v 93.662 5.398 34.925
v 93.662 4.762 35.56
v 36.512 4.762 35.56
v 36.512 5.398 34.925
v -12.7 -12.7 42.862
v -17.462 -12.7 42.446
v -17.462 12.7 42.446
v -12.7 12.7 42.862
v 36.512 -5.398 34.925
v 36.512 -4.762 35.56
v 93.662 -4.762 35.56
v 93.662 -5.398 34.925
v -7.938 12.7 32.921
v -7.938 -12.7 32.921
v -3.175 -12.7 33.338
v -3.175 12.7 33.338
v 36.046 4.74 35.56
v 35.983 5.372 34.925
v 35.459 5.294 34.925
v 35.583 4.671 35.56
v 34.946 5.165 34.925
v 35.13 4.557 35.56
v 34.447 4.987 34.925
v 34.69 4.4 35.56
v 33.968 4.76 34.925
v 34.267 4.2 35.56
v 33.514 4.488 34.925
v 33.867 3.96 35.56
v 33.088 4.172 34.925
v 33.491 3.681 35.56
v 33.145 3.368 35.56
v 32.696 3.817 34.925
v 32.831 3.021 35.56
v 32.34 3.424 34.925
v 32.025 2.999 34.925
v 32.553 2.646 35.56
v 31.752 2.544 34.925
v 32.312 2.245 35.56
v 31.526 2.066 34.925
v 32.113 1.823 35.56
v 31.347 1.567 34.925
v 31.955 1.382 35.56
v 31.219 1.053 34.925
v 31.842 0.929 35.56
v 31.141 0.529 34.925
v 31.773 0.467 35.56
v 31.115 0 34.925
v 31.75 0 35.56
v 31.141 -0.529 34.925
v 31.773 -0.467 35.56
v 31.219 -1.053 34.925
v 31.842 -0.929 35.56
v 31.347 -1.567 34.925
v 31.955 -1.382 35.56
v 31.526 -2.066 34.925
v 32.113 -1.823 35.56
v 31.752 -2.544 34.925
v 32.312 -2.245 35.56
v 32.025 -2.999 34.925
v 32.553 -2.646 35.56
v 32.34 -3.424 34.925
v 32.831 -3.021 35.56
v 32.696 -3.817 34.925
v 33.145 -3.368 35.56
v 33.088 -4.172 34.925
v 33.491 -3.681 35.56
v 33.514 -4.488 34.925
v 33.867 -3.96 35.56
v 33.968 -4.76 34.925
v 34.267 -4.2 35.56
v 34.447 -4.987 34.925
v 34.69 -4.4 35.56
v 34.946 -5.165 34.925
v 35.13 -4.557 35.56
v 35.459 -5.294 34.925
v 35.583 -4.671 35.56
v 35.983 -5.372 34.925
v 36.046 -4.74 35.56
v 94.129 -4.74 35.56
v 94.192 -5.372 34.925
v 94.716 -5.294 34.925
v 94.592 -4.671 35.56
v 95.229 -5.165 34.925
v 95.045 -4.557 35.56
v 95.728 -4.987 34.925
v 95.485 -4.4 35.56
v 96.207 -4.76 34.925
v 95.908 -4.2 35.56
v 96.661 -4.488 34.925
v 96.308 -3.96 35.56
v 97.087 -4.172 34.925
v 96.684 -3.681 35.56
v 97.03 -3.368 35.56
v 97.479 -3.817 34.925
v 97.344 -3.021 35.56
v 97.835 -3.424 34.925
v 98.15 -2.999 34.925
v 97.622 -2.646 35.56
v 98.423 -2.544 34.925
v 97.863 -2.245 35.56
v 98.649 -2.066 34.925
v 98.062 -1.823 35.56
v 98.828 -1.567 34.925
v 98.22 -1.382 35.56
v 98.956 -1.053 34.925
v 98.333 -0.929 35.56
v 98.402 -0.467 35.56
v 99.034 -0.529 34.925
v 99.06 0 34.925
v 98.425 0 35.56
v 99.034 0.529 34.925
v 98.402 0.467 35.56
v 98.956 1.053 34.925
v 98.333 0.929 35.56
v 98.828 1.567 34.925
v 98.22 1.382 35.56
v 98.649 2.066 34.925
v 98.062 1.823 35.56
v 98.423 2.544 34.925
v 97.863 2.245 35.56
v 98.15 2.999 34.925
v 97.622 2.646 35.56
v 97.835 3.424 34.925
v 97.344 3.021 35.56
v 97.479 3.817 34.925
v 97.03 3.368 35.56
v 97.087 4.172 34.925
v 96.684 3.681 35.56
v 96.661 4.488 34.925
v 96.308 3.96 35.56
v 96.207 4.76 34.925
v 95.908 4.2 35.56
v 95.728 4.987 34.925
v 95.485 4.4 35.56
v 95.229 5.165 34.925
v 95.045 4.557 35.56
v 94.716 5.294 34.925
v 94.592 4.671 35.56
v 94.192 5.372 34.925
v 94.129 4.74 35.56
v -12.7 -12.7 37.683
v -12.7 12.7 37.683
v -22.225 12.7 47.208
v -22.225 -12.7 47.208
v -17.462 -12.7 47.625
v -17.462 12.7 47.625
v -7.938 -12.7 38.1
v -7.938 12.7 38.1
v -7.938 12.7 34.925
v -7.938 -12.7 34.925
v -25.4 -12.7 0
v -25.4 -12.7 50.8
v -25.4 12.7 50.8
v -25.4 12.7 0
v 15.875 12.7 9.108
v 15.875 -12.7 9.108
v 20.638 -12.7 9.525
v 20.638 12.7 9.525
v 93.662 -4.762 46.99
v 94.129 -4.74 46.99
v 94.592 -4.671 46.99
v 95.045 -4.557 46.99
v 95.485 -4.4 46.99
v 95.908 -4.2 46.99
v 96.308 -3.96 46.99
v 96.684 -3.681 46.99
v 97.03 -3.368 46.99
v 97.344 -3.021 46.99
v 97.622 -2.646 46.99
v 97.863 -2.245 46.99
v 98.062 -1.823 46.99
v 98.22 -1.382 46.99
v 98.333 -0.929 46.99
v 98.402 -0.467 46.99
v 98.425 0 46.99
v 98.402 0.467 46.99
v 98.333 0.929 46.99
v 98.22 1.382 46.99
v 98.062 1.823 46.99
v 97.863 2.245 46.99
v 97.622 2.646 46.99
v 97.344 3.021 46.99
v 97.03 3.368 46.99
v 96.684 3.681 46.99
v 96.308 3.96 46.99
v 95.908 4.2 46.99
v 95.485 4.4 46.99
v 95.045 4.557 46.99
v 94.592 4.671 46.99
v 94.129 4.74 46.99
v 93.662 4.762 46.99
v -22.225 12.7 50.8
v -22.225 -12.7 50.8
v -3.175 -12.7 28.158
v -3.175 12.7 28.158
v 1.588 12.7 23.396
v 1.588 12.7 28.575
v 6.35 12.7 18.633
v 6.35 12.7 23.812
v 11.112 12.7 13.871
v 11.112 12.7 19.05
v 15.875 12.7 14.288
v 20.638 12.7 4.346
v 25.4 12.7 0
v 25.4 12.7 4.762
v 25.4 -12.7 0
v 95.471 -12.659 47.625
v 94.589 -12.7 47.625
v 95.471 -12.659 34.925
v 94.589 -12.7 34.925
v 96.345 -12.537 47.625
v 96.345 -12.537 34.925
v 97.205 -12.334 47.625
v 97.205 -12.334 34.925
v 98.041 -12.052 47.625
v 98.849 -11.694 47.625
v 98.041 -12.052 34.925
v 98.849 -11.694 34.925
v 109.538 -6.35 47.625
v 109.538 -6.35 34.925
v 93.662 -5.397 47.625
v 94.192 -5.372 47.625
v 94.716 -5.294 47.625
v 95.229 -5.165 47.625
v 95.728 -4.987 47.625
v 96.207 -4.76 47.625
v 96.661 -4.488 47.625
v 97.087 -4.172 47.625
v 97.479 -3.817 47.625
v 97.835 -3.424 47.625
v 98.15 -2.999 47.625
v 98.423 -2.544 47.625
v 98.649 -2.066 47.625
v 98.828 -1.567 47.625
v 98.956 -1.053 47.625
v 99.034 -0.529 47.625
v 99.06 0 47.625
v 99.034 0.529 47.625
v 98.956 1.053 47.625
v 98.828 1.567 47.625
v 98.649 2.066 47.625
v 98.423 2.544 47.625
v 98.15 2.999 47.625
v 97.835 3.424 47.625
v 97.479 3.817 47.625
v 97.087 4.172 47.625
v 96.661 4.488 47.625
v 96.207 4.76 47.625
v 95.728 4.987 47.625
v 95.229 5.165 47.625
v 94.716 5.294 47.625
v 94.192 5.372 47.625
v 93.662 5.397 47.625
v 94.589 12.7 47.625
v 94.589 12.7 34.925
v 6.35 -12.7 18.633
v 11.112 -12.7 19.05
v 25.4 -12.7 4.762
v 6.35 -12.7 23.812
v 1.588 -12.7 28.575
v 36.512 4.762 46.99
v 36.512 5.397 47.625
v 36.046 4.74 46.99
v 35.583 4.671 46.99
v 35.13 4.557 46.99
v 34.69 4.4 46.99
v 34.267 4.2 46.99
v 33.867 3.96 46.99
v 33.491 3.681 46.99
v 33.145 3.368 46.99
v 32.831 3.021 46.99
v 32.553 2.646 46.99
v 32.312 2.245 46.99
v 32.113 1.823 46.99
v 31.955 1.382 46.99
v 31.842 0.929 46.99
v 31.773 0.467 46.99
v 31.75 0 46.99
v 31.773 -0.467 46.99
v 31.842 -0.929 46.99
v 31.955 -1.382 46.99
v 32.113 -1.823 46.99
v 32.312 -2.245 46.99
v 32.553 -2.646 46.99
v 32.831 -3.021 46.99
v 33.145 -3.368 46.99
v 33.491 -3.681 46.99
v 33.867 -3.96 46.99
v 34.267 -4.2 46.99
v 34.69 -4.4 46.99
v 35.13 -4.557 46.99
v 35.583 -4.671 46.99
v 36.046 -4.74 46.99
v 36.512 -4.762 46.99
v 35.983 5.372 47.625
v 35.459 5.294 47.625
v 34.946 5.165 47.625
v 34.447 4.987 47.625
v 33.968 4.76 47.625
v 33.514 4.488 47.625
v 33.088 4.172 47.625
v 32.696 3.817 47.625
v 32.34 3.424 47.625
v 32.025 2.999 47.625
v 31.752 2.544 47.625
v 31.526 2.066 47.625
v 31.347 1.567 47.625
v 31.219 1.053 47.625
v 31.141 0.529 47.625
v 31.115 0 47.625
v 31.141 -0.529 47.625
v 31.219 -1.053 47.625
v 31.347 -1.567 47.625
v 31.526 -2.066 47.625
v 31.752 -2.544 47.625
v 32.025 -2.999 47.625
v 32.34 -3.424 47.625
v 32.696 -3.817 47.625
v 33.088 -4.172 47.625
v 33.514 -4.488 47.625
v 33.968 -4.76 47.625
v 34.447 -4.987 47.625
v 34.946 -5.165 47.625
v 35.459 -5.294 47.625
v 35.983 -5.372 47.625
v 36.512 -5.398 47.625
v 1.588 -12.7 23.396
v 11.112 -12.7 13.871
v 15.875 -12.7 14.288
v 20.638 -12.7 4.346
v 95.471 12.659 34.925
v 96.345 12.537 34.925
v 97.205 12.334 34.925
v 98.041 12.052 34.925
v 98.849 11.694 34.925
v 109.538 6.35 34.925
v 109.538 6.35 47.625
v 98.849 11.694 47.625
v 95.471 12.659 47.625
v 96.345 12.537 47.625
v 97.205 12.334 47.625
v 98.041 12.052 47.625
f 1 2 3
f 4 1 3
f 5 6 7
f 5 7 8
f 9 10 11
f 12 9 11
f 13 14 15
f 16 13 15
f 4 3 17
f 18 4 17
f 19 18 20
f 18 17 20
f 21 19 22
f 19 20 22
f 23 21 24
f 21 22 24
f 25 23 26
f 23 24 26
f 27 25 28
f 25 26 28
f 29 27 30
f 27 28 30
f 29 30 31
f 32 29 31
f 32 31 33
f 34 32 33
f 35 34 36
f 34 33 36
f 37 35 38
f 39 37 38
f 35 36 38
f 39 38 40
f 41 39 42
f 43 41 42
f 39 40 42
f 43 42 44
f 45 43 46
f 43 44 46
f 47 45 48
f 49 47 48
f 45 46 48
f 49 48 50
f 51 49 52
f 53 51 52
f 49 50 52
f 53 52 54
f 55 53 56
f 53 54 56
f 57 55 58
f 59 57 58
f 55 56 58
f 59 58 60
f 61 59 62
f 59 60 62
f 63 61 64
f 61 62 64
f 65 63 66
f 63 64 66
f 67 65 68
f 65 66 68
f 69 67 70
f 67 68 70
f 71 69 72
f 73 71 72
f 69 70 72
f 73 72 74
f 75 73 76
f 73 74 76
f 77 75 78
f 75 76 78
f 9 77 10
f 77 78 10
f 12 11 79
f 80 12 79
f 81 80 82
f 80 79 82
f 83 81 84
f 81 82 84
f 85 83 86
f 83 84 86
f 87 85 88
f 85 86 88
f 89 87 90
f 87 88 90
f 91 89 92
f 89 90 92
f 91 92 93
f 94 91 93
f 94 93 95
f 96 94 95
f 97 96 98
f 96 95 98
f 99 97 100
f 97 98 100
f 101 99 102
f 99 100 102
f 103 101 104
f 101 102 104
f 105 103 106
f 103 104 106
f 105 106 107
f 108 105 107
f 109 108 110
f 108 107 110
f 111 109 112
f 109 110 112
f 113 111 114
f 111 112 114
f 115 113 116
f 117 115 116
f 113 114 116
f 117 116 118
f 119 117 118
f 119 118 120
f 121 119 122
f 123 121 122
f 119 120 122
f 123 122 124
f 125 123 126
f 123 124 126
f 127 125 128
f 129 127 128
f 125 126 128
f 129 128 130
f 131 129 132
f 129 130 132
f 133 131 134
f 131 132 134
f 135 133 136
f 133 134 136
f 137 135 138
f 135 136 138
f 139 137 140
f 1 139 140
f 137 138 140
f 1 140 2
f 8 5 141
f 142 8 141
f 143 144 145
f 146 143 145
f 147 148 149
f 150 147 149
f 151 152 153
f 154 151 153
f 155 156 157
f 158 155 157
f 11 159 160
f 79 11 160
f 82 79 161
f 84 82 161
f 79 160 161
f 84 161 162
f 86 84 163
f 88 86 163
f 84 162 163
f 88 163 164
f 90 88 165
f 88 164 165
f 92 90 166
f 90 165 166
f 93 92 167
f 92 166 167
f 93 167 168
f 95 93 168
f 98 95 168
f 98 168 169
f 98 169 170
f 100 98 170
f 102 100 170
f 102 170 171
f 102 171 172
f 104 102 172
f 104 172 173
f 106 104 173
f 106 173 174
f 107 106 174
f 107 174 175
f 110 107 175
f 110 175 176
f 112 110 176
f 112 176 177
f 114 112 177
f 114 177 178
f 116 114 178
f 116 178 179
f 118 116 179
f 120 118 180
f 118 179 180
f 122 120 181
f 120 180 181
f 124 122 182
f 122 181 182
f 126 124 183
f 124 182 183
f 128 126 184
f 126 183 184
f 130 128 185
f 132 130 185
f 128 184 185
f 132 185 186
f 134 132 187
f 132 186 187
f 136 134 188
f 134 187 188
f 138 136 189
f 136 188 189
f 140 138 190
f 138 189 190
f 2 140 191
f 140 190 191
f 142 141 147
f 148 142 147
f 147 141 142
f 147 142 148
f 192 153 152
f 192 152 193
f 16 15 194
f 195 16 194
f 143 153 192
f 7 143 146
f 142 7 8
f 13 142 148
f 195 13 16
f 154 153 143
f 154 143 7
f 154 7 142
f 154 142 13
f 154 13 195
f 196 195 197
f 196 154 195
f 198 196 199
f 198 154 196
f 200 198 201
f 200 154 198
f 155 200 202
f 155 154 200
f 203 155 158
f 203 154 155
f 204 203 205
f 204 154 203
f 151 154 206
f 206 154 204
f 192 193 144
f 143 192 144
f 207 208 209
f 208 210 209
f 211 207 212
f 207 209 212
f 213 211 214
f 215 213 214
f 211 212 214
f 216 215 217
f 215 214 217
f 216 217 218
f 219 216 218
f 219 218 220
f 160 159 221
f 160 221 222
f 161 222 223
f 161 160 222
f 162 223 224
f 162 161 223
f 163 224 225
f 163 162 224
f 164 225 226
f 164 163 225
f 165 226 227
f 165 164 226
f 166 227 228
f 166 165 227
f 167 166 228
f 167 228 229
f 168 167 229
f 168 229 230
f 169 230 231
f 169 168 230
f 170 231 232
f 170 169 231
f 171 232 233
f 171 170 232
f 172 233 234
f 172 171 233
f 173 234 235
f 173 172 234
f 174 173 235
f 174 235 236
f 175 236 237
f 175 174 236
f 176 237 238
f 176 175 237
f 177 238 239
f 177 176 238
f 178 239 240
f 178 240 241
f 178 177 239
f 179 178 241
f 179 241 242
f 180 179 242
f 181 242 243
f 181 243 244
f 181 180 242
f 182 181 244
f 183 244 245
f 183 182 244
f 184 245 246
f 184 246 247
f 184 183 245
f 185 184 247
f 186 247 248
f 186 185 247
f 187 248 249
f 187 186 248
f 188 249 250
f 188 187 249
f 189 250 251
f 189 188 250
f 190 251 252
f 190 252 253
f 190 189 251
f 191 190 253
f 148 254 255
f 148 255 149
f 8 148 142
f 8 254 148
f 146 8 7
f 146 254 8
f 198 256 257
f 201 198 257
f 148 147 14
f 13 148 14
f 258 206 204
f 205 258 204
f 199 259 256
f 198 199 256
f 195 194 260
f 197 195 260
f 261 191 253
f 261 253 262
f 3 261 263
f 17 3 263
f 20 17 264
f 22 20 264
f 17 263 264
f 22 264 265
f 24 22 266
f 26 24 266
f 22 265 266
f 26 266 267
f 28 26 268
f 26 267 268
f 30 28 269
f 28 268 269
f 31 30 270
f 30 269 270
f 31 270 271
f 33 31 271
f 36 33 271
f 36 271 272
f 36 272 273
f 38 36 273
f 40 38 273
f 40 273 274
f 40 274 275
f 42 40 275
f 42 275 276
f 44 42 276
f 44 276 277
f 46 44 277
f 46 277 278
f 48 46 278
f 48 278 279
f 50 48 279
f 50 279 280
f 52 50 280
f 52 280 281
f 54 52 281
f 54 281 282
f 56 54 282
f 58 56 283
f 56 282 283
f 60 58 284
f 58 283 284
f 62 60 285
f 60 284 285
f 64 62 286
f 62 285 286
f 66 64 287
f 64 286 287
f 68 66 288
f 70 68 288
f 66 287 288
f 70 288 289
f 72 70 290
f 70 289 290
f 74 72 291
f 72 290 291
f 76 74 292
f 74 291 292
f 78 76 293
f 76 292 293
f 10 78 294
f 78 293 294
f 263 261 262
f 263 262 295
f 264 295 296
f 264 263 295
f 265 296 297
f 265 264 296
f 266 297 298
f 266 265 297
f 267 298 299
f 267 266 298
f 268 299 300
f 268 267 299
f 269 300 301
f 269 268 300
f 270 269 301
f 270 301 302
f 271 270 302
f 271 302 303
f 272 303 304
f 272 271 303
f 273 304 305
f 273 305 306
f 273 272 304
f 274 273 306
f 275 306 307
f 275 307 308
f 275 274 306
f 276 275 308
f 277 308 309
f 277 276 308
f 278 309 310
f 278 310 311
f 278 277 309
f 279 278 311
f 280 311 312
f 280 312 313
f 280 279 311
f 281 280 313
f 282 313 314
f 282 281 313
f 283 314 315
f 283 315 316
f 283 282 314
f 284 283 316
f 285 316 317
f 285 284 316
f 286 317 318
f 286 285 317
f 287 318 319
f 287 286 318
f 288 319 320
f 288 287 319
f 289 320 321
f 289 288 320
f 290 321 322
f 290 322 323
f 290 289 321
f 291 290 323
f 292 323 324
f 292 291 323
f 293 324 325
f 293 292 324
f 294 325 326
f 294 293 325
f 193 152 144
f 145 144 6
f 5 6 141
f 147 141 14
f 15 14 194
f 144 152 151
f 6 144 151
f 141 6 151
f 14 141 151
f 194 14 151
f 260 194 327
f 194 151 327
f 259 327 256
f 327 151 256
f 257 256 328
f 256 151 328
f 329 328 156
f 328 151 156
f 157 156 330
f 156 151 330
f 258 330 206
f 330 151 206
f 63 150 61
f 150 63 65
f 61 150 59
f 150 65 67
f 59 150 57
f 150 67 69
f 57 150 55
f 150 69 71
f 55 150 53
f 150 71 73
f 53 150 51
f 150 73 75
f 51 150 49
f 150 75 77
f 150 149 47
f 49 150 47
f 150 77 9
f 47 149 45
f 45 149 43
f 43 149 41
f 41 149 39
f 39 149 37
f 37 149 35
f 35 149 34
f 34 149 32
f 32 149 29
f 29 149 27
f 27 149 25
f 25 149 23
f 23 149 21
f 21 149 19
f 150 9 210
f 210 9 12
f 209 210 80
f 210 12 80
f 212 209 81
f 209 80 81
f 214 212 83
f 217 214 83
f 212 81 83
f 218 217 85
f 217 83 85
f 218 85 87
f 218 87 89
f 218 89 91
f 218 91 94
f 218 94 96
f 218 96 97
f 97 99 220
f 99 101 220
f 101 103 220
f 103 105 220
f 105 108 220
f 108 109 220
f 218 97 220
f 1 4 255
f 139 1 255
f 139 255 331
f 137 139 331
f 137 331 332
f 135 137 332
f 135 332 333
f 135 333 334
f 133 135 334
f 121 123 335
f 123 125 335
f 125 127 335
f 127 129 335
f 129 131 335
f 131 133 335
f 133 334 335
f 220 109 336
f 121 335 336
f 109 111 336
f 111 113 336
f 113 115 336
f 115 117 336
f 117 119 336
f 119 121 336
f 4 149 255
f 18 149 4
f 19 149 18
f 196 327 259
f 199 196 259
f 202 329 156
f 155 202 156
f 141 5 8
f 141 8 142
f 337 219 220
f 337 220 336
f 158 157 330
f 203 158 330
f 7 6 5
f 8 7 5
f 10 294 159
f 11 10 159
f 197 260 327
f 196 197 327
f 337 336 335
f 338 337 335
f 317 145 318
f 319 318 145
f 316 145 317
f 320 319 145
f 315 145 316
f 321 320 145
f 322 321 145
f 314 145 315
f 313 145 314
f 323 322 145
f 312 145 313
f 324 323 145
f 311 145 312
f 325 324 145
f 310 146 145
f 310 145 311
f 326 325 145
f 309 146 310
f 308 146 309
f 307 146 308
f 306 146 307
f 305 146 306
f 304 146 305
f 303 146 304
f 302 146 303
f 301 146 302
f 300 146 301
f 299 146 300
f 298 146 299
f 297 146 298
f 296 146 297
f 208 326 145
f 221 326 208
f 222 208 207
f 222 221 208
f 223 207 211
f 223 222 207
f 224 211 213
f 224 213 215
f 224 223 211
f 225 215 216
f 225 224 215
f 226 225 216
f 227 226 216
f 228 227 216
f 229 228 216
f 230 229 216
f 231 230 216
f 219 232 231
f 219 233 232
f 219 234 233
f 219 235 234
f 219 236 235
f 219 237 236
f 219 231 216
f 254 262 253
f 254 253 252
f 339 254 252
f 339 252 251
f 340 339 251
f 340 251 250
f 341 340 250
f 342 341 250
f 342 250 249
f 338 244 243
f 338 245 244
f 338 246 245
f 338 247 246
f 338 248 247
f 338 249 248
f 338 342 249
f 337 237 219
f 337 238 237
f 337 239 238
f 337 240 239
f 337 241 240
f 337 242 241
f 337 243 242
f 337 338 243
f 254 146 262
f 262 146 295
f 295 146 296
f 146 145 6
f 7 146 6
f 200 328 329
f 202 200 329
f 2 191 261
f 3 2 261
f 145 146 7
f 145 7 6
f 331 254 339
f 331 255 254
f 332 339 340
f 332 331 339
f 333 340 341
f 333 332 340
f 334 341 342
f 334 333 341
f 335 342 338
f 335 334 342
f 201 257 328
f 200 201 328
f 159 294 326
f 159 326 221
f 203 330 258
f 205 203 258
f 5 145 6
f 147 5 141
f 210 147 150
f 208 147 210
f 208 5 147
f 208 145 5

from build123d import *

# Parameters (mm, degrees)
F0_W      = 50.8
F0_H      = 25.4
F1_DEPTH  = 50.8
F8_DEPTH  = 25.401
F10_DEPTH = 12.6999998465
F4_DEPTH  = 47.626
F12_SIZE  = 0.635
F13_R     = 9.525


with BuildPart() as f1:
    # F0 (on Top) → F1 (new body)
    with BuildSketch(Plane.XY):
        Rectangle(F0_W, F0_H)
    extrude(amount=F1_DEPTH)

    # F7 (on offset) → F8 (cut, through all)
    with BuildSketch(Plane.XZ.offset(12.7)):
        Polygon((20.6375, 4.34583524), (25.4, 4.7625), (25.4, 68.2625), (-22.225, 68.2625), (-22.225, 47.20833524), (-17.4625, 47.625), (-17.4625, 42.44583524), (-12.7, 42.8625), (-12.7, 37.68333524), (-7.9375, 38.1), (-7.9375, 32.92083524), (-3.175, 33.3375), (-3.175, 28.15833524), (1.5875, 28.575), (1.5875, 23.39583524), (6.35, 23.8125), (6.35, 18.63333524), (11.1125, 19.05), (11.1125, 13.87083524), (15.875, 14.2875), (15.875, 9.10833524), (20.6375, 9.525), align=None)
    extrude(amount=-F8_DEPTH, mode=Mode.SUBTRACT)


with BuildPart() as f10:
    # F9 (on offset) → F10 (new body)
    with BuildSketch(Plane.XY.offset(47.625)):
        Polygon((96.8375, 12.7), (-17.4625, 12.7), (-17.4625, -12.7), (96.8375, -12.7), (109.5375, -6.35), (109.5375, 0), (109.5375, 6.35), align=None)
    extrude(amount=-F10_DEPTH)

    # F11 (on face) → F4 (cut, through all)
    with BuildSketch(Plane.XY.offset(47.625)):
        with BuildLine():
            ThreePointArc((36.5125, 4.7625), (31.75, 0), (36.5125, -4.7625))
            Line((36.5125, -4.7625), (93.6625, -4.7625))
            ThreePointArc((93.6625, -4.7625), (98.425, 0), (93.6625, 4.7625))
            Line((93.6625, 4.7625), (36.5125, 4.7625))
        make_face()
    extrude(amount=-F4_DEPTH, mode=Mode.SUBTRACT)

    # F5: cut F1
    add(f1.part, mode=Mode.SUBTRACT)

    # F12
    f12_edges = [f10.edges().sort_by_distance(p)[0] for p in [
        (65.0875, 4.7625, 47.625),
        (65.0875, -4.7625, 34.925),
    ]]
    chamfer(f12_edges, length=F12_SIZE)

    # F13
    f13_edges = [f10.edges().sort_by_distance(p)[0] for p in [
        (96.8375, -12.7, 41.275),
        (96.8375, 12.7, 41.275),
    ]]
    fillet(f13_edges, radius=F13_R)


solid = Compound([f1.part, f10.part])
